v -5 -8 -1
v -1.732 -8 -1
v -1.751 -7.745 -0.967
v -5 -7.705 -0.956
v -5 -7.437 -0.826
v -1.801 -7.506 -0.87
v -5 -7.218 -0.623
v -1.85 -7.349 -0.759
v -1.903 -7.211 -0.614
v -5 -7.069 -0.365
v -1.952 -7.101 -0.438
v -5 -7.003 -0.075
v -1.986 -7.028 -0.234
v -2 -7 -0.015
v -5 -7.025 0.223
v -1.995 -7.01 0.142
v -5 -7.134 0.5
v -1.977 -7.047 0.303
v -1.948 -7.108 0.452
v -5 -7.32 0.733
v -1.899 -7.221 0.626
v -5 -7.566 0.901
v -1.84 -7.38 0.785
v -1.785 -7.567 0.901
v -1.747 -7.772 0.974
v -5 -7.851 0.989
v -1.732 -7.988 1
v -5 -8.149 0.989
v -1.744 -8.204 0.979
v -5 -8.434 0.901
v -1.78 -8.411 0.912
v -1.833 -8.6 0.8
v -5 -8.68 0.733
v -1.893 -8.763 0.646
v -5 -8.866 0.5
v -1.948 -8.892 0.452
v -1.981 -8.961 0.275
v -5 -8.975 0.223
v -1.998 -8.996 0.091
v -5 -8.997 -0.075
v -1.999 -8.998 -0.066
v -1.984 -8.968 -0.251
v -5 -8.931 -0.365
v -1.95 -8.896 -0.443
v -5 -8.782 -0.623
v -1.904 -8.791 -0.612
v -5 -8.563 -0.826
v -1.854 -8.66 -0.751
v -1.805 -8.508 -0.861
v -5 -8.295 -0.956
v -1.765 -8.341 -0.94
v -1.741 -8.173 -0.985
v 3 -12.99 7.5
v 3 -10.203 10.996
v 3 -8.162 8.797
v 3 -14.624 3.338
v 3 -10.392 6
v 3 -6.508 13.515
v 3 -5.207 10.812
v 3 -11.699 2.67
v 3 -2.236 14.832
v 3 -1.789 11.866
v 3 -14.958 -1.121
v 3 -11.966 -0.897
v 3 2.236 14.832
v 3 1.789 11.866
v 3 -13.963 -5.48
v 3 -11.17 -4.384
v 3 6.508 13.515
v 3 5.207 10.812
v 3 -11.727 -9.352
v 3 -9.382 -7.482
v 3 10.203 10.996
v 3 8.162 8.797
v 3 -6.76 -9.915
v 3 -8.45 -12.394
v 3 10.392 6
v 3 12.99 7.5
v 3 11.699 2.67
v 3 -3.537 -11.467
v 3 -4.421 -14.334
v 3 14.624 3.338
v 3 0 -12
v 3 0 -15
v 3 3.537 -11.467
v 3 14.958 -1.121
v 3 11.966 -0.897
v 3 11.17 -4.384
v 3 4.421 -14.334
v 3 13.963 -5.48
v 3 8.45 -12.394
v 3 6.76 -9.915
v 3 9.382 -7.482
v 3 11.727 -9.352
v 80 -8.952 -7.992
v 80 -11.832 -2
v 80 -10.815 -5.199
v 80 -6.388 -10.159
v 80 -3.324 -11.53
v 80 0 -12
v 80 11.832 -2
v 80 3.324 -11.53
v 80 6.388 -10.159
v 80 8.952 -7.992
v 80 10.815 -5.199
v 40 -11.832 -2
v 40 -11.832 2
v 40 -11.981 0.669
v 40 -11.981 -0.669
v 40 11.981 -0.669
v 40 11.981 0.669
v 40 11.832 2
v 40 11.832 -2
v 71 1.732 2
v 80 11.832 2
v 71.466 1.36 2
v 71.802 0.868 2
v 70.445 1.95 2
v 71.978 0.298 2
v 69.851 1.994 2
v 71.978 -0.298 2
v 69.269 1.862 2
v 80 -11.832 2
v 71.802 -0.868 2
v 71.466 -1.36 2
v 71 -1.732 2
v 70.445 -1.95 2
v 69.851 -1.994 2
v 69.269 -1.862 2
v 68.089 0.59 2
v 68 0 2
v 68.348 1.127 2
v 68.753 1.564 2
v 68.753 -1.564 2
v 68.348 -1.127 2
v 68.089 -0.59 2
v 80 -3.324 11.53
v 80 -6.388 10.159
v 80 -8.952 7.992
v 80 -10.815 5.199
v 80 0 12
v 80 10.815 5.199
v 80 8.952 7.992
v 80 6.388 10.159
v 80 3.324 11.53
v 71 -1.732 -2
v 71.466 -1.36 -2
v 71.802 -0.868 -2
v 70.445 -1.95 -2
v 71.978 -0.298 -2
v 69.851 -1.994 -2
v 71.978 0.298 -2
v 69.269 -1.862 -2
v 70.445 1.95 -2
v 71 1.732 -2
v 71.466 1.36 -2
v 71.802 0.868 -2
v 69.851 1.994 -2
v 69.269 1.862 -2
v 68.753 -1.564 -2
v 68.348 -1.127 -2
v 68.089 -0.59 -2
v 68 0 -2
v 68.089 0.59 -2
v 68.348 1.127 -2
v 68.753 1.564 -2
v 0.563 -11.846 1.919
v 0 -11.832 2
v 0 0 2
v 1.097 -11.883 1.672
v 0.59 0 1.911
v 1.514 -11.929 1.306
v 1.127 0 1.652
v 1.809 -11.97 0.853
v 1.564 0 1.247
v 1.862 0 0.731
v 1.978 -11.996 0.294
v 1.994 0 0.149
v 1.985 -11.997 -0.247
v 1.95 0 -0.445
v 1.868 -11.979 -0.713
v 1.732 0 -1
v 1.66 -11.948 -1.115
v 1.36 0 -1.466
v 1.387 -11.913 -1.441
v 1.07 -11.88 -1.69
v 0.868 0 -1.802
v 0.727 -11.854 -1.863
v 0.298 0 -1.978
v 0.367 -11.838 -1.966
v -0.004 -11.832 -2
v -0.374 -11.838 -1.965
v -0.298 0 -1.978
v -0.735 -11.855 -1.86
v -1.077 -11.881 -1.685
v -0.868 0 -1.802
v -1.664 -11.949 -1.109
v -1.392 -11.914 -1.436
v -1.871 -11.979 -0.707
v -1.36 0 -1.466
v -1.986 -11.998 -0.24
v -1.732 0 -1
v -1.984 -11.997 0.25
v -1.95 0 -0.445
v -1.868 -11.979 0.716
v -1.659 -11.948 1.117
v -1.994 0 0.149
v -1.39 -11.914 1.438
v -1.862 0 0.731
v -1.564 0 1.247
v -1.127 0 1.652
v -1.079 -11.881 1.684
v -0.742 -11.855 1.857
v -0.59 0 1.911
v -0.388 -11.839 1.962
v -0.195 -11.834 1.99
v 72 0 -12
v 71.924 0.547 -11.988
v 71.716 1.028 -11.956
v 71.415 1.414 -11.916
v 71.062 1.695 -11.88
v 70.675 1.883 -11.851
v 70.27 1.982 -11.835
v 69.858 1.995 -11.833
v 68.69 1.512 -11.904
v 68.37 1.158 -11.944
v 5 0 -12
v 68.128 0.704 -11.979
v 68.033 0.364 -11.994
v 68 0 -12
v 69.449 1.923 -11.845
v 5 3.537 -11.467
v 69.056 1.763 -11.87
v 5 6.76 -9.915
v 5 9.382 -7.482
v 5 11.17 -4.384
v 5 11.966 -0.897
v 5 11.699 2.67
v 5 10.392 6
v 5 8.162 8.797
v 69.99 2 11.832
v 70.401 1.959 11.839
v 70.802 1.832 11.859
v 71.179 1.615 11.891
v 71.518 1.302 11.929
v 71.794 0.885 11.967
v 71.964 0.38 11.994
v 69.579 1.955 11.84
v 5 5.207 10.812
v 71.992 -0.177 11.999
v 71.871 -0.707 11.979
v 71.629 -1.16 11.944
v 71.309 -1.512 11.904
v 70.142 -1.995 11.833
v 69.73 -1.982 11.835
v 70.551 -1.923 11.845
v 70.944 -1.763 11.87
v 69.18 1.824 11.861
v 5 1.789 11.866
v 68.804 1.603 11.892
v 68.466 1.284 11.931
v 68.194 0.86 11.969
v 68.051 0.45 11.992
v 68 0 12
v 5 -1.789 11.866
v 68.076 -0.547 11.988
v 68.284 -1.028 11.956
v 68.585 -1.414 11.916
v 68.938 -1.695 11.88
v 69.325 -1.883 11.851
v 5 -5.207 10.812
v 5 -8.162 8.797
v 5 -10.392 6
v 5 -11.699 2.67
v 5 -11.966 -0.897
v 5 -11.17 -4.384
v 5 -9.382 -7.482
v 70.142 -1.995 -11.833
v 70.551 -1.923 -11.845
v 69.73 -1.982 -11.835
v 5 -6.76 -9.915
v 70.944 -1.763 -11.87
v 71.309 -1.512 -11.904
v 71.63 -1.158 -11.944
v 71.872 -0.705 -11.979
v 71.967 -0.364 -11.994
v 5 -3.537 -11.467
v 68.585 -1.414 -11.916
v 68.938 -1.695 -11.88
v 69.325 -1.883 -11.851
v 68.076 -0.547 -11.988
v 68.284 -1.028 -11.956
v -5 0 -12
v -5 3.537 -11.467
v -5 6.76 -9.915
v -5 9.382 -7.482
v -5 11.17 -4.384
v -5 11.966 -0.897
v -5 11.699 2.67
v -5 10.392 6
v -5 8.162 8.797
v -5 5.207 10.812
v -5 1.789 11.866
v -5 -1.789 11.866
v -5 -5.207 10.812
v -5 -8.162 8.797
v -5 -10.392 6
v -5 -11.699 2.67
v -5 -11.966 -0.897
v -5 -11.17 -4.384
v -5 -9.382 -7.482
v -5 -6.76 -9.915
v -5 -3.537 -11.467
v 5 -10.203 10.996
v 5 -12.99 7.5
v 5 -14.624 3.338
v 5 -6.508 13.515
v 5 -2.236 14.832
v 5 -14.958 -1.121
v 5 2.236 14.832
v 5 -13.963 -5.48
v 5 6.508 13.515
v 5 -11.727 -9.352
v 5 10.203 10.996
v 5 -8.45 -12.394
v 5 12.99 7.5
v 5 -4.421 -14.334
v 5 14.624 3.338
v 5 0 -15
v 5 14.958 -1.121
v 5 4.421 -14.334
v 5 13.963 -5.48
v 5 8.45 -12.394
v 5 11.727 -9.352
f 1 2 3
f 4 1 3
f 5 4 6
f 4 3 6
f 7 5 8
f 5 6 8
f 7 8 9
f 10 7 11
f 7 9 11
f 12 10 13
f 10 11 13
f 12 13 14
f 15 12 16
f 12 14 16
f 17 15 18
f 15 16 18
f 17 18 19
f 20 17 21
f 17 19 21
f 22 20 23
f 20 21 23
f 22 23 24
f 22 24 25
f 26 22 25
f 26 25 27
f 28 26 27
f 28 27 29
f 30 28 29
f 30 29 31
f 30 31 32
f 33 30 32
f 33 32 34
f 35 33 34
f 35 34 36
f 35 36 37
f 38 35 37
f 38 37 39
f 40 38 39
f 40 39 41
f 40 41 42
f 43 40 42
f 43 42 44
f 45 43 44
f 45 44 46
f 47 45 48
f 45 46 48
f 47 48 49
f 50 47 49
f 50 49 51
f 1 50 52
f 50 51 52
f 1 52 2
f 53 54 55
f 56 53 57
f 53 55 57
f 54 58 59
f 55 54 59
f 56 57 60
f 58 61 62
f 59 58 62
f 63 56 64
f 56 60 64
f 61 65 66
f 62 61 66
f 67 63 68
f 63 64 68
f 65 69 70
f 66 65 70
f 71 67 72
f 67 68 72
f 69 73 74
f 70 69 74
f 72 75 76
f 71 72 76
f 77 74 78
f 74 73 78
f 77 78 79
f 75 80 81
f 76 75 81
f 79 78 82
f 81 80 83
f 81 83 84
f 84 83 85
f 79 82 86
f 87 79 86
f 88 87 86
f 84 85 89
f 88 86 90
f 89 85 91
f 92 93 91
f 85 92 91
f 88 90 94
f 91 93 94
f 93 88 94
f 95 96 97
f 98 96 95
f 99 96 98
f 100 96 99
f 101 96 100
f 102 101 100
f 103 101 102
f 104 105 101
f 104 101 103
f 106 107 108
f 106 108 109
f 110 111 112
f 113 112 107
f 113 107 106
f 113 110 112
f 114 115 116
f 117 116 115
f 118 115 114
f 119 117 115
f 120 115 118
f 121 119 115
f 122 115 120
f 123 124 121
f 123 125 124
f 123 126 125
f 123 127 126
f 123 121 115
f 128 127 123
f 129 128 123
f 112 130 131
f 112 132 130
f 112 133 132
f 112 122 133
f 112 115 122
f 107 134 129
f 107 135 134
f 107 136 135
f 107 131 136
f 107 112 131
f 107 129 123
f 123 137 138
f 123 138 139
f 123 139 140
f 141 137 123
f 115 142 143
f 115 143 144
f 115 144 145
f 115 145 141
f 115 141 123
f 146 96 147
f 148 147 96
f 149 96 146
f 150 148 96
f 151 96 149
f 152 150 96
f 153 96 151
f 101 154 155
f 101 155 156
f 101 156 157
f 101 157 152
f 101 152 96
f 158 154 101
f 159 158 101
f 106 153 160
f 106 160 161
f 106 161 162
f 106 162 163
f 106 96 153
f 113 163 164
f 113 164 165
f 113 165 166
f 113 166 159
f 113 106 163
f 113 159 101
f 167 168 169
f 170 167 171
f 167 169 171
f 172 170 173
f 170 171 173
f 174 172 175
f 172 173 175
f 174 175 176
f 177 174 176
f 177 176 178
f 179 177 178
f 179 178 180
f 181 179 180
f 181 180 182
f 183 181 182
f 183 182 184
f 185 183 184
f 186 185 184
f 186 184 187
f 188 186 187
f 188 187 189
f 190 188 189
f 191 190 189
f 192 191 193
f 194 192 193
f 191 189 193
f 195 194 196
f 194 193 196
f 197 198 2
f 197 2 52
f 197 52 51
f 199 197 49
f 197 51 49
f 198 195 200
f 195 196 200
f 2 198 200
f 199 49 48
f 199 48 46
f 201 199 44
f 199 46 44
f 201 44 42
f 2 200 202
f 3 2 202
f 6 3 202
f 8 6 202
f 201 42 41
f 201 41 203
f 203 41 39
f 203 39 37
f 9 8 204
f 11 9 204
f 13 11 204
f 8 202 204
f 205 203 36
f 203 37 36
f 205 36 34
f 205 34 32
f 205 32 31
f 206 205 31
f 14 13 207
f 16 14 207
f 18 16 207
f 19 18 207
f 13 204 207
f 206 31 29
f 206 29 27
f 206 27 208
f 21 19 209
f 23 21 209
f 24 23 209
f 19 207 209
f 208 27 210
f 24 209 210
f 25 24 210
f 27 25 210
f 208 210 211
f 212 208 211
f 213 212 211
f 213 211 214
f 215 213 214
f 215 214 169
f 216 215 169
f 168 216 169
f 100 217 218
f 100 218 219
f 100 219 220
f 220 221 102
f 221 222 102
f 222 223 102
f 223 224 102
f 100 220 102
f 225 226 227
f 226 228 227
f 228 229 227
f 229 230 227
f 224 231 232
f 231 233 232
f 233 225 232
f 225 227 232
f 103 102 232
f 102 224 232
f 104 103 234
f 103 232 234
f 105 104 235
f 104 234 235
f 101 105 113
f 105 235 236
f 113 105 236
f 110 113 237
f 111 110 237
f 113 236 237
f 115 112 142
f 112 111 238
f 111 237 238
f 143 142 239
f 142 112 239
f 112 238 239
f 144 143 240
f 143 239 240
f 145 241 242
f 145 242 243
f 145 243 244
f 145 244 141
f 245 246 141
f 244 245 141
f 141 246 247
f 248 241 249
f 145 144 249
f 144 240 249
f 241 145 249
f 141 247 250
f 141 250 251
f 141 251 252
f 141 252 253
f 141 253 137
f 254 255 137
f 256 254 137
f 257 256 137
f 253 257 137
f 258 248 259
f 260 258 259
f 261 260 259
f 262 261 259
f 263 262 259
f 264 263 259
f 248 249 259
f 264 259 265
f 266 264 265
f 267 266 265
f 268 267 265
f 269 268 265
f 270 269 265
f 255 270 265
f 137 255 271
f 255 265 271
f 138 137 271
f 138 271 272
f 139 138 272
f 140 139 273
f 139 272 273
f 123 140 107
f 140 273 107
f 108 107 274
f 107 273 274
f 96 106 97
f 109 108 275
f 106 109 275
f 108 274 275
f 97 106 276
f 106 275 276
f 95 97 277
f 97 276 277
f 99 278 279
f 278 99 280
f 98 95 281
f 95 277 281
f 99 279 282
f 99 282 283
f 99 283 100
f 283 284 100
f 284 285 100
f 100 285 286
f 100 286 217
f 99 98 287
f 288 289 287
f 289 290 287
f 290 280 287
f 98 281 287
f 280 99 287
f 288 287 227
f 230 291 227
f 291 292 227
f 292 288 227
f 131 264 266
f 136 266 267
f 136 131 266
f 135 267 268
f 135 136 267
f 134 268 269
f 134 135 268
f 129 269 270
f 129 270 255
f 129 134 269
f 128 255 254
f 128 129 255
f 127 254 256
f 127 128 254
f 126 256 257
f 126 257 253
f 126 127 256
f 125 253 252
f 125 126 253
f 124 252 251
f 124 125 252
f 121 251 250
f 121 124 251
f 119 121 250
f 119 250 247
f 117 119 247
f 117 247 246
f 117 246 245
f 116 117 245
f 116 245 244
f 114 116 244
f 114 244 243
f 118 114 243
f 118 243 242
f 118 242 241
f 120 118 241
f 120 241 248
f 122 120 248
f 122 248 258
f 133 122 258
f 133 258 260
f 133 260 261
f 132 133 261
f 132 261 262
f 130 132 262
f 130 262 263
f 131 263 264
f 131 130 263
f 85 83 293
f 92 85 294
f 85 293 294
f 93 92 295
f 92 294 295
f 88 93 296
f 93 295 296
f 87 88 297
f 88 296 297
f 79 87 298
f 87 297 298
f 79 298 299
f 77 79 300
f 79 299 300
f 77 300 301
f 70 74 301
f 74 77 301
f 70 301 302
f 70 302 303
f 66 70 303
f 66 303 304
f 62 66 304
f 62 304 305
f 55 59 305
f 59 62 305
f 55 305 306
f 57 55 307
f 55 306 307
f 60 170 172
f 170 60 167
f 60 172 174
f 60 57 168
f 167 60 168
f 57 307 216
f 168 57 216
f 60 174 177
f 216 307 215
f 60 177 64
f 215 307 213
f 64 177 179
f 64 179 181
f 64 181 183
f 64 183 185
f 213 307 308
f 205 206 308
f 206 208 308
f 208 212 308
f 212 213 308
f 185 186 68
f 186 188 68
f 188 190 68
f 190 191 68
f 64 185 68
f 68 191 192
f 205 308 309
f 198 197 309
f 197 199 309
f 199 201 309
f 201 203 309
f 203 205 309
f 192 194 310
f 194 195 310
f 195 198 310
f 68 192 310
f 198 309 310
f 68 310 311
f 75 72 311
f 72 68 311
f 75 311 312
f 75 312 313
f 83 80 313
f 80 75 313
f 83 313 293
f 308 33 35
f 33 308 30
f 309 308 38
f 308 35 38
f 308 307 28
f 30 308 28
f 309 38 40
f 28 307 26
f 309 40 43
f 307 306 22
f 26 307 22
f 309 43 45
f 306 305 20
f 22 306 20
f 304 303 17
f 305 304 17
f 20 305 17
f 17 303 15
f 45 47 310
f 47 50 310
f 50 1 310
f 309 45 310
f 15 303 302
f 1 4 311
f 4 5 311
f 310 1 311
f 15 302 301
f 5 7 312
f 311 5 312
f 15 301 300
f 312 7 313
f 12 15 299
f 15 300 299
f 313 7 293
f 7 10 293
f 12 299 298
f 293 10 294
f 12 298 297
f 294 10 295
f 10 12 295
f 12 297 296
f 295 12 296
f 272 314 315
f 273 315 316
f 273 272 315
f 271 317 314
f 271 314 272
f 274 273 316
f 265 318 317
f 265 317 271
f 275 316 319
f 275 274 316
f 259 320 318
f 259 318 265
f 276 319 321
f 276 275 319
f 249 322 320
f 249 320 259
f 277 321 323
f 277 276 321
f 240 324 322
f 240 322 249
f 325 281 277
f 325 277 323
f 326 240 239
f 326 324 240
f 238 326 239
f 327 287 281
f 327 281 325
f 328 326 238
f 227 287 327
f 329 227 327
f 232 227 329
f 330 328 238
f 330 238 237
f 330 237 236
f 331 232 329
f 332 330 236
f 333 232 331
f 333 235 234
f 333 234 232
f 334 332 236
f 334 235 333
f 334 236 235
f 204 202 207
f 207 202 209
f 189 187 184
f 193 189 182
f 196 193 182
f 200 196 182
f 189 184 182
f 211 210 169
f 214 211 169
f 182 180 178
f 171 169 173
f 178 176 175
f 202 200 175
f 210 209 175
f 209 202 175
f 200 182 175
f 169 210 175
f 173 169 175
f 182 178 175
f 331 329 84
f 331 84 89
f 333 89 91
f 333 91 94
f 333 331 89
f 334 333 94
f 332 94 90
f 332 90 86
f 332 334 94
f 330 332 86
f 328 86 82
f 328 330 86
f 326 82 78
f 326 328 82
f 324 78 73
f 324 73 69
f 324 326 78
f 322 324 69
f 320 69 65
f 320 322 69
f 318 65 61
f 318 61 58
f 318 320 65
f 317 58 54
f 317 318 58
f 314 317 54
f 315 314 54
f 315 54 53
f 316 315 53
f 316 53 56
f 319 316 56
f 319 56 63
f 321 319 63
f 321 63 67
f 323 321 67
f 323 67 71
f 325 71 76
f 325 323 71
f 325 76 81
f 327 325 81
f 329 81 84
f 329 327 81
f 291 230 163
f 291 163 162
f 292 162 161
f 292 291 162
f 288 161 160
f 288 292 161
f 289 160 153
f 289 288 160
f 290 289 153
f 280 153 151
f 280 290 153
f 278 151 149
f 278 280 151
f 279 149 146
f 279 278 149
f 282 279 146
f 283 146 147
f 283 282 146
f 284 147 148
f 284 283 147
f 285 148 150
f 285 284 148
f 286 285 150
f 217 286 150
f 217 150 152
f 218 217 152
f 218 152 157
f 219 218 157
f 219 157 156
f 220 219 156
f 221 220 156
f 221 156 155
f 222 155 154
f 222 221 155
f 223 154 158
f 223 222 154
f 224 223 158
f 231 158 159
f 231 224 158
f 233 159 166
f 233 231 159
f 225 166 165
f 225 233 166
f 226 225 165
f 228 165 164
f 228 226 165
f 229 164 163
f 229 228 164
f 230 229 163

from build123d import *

# Parameters (mm, degrees)
EXTRUDE_1_DEPTH          = 80
EXTRUDE_1_DEPTH_BACK     = 5
SKETCH_2_R               = 12
SKETCH_1_R               = 2
CUT_EXTRUDE_1_DEPTH      = 80
SKETCH_4_R               = 15
EXTRUDE_2_DEPTH          = 2
CUT_EXTRUDE_START        = -40
CUT_EXTRUDE_2_DEPTH      = 40
CUT_EXTRUDE_3_DEPTH      = 40
CUT_EXTRUDE_3_DEPTH_BACK = 40
SKETCH_8_R               = 2
SKETCH_10_R              = 1
CUT_EXTRUDE_4_DEPTH      = 83.764726883


with BuildPart() as part:
    # 草图2 → 凸台-拉伸1 (new, two sides: drawn at the far end of the back side and taken through both)
    with BuildSketch(Plane(origin=(0, 0, 0), x_dir=(0, 0, -1), z_dir=(1, 0, 0)).offset(-EXTRUDE_1_DEPTH_BACK)):
        Circle(SKETCH_2_R)
    extrude(amount=EXTRUDE_1_DEPTH + EXTRUDE_1_DEPTH_BACK)

    # 草图1 → 切除-拉伸1 (cut)
    with BuildSketch(Plane(origin=(0, 0, 0), x_dir=(1, 0, 0), z_dir=(0, 1, 0))):
        with Locations(Location((0, 0, 0), (0, 0, 270))):
            Circle(SKETCH_1_R)
    extrude(amount=-CUT_EXTRUDE_1_DEPTH, mode=Mode.SUBTRACT)

    # 草图4 → 凸台-拉伸2 (add)
    with BuildSketch(Plane(origin=(5, 0, 0), x_dir=(0, 0, -1), z_dir=(1, 0, 0))):
        Circle(SKETCH_4_R)
    extrude(amount=-EXTRUDE_2_DEPTH)

    # 草图7 → 切除-拉伸2 (cut)
    with BuildSketch(Plane(origin=(80, 0, 0), x_dir=(0, 0, -1), z_dir=(1, 0, 0)).offset(CUT_EXTRUDE_START)):
        with BuildLine():
            ThreePointArc((2, 11.832159566), (0, 12), (-2, 11.832159566))
            Line((-2, 11.832159566), (-2, -11.832159566))
            ThreePointArc((-2, -11.832159566), (0, -12), (2, -11.832159566))
            Line((2, -11.832159566), (2, 11.832159566))
        make_face()
    extrude(amount=CUT_EXTRUDE_2_DEPTH, mode=Mode.SUBTRACT)

    # 草图8 → 切除-拉伸3 (cut, two sides: drawn at the far end of the back side and taken through both)
    with BuildSketch(Plane.XY.offset(-2).offset(-CUT_EXTRUDE_3_DEPTH_BACK)):
        with Locations(Location((70, 0, 0), (0, 0, 180))):
            Circle(SKETCH_8_R)
    extrude(amount=CUT_EXTRUDE_3_DEPTH + CUT_EXTRUDE_3_DEPTH_BACK, mode=Mode.SUBTRACT)

    # 草图10 → 切除-拉伸4 (cut, through all)
    with BuildSketch(Plane(origin=(0, 0, 0), x_dir=(0, 0, -1), z_dir=(1, 0, 0))):
        with Locations((0, -8)):
            Circle(SKETCH_10_R)
    extrude(amount=-CUT_EXTRUDE_4_DEPTH, mode=Mode.SUBTRACT)


solid = part.part
